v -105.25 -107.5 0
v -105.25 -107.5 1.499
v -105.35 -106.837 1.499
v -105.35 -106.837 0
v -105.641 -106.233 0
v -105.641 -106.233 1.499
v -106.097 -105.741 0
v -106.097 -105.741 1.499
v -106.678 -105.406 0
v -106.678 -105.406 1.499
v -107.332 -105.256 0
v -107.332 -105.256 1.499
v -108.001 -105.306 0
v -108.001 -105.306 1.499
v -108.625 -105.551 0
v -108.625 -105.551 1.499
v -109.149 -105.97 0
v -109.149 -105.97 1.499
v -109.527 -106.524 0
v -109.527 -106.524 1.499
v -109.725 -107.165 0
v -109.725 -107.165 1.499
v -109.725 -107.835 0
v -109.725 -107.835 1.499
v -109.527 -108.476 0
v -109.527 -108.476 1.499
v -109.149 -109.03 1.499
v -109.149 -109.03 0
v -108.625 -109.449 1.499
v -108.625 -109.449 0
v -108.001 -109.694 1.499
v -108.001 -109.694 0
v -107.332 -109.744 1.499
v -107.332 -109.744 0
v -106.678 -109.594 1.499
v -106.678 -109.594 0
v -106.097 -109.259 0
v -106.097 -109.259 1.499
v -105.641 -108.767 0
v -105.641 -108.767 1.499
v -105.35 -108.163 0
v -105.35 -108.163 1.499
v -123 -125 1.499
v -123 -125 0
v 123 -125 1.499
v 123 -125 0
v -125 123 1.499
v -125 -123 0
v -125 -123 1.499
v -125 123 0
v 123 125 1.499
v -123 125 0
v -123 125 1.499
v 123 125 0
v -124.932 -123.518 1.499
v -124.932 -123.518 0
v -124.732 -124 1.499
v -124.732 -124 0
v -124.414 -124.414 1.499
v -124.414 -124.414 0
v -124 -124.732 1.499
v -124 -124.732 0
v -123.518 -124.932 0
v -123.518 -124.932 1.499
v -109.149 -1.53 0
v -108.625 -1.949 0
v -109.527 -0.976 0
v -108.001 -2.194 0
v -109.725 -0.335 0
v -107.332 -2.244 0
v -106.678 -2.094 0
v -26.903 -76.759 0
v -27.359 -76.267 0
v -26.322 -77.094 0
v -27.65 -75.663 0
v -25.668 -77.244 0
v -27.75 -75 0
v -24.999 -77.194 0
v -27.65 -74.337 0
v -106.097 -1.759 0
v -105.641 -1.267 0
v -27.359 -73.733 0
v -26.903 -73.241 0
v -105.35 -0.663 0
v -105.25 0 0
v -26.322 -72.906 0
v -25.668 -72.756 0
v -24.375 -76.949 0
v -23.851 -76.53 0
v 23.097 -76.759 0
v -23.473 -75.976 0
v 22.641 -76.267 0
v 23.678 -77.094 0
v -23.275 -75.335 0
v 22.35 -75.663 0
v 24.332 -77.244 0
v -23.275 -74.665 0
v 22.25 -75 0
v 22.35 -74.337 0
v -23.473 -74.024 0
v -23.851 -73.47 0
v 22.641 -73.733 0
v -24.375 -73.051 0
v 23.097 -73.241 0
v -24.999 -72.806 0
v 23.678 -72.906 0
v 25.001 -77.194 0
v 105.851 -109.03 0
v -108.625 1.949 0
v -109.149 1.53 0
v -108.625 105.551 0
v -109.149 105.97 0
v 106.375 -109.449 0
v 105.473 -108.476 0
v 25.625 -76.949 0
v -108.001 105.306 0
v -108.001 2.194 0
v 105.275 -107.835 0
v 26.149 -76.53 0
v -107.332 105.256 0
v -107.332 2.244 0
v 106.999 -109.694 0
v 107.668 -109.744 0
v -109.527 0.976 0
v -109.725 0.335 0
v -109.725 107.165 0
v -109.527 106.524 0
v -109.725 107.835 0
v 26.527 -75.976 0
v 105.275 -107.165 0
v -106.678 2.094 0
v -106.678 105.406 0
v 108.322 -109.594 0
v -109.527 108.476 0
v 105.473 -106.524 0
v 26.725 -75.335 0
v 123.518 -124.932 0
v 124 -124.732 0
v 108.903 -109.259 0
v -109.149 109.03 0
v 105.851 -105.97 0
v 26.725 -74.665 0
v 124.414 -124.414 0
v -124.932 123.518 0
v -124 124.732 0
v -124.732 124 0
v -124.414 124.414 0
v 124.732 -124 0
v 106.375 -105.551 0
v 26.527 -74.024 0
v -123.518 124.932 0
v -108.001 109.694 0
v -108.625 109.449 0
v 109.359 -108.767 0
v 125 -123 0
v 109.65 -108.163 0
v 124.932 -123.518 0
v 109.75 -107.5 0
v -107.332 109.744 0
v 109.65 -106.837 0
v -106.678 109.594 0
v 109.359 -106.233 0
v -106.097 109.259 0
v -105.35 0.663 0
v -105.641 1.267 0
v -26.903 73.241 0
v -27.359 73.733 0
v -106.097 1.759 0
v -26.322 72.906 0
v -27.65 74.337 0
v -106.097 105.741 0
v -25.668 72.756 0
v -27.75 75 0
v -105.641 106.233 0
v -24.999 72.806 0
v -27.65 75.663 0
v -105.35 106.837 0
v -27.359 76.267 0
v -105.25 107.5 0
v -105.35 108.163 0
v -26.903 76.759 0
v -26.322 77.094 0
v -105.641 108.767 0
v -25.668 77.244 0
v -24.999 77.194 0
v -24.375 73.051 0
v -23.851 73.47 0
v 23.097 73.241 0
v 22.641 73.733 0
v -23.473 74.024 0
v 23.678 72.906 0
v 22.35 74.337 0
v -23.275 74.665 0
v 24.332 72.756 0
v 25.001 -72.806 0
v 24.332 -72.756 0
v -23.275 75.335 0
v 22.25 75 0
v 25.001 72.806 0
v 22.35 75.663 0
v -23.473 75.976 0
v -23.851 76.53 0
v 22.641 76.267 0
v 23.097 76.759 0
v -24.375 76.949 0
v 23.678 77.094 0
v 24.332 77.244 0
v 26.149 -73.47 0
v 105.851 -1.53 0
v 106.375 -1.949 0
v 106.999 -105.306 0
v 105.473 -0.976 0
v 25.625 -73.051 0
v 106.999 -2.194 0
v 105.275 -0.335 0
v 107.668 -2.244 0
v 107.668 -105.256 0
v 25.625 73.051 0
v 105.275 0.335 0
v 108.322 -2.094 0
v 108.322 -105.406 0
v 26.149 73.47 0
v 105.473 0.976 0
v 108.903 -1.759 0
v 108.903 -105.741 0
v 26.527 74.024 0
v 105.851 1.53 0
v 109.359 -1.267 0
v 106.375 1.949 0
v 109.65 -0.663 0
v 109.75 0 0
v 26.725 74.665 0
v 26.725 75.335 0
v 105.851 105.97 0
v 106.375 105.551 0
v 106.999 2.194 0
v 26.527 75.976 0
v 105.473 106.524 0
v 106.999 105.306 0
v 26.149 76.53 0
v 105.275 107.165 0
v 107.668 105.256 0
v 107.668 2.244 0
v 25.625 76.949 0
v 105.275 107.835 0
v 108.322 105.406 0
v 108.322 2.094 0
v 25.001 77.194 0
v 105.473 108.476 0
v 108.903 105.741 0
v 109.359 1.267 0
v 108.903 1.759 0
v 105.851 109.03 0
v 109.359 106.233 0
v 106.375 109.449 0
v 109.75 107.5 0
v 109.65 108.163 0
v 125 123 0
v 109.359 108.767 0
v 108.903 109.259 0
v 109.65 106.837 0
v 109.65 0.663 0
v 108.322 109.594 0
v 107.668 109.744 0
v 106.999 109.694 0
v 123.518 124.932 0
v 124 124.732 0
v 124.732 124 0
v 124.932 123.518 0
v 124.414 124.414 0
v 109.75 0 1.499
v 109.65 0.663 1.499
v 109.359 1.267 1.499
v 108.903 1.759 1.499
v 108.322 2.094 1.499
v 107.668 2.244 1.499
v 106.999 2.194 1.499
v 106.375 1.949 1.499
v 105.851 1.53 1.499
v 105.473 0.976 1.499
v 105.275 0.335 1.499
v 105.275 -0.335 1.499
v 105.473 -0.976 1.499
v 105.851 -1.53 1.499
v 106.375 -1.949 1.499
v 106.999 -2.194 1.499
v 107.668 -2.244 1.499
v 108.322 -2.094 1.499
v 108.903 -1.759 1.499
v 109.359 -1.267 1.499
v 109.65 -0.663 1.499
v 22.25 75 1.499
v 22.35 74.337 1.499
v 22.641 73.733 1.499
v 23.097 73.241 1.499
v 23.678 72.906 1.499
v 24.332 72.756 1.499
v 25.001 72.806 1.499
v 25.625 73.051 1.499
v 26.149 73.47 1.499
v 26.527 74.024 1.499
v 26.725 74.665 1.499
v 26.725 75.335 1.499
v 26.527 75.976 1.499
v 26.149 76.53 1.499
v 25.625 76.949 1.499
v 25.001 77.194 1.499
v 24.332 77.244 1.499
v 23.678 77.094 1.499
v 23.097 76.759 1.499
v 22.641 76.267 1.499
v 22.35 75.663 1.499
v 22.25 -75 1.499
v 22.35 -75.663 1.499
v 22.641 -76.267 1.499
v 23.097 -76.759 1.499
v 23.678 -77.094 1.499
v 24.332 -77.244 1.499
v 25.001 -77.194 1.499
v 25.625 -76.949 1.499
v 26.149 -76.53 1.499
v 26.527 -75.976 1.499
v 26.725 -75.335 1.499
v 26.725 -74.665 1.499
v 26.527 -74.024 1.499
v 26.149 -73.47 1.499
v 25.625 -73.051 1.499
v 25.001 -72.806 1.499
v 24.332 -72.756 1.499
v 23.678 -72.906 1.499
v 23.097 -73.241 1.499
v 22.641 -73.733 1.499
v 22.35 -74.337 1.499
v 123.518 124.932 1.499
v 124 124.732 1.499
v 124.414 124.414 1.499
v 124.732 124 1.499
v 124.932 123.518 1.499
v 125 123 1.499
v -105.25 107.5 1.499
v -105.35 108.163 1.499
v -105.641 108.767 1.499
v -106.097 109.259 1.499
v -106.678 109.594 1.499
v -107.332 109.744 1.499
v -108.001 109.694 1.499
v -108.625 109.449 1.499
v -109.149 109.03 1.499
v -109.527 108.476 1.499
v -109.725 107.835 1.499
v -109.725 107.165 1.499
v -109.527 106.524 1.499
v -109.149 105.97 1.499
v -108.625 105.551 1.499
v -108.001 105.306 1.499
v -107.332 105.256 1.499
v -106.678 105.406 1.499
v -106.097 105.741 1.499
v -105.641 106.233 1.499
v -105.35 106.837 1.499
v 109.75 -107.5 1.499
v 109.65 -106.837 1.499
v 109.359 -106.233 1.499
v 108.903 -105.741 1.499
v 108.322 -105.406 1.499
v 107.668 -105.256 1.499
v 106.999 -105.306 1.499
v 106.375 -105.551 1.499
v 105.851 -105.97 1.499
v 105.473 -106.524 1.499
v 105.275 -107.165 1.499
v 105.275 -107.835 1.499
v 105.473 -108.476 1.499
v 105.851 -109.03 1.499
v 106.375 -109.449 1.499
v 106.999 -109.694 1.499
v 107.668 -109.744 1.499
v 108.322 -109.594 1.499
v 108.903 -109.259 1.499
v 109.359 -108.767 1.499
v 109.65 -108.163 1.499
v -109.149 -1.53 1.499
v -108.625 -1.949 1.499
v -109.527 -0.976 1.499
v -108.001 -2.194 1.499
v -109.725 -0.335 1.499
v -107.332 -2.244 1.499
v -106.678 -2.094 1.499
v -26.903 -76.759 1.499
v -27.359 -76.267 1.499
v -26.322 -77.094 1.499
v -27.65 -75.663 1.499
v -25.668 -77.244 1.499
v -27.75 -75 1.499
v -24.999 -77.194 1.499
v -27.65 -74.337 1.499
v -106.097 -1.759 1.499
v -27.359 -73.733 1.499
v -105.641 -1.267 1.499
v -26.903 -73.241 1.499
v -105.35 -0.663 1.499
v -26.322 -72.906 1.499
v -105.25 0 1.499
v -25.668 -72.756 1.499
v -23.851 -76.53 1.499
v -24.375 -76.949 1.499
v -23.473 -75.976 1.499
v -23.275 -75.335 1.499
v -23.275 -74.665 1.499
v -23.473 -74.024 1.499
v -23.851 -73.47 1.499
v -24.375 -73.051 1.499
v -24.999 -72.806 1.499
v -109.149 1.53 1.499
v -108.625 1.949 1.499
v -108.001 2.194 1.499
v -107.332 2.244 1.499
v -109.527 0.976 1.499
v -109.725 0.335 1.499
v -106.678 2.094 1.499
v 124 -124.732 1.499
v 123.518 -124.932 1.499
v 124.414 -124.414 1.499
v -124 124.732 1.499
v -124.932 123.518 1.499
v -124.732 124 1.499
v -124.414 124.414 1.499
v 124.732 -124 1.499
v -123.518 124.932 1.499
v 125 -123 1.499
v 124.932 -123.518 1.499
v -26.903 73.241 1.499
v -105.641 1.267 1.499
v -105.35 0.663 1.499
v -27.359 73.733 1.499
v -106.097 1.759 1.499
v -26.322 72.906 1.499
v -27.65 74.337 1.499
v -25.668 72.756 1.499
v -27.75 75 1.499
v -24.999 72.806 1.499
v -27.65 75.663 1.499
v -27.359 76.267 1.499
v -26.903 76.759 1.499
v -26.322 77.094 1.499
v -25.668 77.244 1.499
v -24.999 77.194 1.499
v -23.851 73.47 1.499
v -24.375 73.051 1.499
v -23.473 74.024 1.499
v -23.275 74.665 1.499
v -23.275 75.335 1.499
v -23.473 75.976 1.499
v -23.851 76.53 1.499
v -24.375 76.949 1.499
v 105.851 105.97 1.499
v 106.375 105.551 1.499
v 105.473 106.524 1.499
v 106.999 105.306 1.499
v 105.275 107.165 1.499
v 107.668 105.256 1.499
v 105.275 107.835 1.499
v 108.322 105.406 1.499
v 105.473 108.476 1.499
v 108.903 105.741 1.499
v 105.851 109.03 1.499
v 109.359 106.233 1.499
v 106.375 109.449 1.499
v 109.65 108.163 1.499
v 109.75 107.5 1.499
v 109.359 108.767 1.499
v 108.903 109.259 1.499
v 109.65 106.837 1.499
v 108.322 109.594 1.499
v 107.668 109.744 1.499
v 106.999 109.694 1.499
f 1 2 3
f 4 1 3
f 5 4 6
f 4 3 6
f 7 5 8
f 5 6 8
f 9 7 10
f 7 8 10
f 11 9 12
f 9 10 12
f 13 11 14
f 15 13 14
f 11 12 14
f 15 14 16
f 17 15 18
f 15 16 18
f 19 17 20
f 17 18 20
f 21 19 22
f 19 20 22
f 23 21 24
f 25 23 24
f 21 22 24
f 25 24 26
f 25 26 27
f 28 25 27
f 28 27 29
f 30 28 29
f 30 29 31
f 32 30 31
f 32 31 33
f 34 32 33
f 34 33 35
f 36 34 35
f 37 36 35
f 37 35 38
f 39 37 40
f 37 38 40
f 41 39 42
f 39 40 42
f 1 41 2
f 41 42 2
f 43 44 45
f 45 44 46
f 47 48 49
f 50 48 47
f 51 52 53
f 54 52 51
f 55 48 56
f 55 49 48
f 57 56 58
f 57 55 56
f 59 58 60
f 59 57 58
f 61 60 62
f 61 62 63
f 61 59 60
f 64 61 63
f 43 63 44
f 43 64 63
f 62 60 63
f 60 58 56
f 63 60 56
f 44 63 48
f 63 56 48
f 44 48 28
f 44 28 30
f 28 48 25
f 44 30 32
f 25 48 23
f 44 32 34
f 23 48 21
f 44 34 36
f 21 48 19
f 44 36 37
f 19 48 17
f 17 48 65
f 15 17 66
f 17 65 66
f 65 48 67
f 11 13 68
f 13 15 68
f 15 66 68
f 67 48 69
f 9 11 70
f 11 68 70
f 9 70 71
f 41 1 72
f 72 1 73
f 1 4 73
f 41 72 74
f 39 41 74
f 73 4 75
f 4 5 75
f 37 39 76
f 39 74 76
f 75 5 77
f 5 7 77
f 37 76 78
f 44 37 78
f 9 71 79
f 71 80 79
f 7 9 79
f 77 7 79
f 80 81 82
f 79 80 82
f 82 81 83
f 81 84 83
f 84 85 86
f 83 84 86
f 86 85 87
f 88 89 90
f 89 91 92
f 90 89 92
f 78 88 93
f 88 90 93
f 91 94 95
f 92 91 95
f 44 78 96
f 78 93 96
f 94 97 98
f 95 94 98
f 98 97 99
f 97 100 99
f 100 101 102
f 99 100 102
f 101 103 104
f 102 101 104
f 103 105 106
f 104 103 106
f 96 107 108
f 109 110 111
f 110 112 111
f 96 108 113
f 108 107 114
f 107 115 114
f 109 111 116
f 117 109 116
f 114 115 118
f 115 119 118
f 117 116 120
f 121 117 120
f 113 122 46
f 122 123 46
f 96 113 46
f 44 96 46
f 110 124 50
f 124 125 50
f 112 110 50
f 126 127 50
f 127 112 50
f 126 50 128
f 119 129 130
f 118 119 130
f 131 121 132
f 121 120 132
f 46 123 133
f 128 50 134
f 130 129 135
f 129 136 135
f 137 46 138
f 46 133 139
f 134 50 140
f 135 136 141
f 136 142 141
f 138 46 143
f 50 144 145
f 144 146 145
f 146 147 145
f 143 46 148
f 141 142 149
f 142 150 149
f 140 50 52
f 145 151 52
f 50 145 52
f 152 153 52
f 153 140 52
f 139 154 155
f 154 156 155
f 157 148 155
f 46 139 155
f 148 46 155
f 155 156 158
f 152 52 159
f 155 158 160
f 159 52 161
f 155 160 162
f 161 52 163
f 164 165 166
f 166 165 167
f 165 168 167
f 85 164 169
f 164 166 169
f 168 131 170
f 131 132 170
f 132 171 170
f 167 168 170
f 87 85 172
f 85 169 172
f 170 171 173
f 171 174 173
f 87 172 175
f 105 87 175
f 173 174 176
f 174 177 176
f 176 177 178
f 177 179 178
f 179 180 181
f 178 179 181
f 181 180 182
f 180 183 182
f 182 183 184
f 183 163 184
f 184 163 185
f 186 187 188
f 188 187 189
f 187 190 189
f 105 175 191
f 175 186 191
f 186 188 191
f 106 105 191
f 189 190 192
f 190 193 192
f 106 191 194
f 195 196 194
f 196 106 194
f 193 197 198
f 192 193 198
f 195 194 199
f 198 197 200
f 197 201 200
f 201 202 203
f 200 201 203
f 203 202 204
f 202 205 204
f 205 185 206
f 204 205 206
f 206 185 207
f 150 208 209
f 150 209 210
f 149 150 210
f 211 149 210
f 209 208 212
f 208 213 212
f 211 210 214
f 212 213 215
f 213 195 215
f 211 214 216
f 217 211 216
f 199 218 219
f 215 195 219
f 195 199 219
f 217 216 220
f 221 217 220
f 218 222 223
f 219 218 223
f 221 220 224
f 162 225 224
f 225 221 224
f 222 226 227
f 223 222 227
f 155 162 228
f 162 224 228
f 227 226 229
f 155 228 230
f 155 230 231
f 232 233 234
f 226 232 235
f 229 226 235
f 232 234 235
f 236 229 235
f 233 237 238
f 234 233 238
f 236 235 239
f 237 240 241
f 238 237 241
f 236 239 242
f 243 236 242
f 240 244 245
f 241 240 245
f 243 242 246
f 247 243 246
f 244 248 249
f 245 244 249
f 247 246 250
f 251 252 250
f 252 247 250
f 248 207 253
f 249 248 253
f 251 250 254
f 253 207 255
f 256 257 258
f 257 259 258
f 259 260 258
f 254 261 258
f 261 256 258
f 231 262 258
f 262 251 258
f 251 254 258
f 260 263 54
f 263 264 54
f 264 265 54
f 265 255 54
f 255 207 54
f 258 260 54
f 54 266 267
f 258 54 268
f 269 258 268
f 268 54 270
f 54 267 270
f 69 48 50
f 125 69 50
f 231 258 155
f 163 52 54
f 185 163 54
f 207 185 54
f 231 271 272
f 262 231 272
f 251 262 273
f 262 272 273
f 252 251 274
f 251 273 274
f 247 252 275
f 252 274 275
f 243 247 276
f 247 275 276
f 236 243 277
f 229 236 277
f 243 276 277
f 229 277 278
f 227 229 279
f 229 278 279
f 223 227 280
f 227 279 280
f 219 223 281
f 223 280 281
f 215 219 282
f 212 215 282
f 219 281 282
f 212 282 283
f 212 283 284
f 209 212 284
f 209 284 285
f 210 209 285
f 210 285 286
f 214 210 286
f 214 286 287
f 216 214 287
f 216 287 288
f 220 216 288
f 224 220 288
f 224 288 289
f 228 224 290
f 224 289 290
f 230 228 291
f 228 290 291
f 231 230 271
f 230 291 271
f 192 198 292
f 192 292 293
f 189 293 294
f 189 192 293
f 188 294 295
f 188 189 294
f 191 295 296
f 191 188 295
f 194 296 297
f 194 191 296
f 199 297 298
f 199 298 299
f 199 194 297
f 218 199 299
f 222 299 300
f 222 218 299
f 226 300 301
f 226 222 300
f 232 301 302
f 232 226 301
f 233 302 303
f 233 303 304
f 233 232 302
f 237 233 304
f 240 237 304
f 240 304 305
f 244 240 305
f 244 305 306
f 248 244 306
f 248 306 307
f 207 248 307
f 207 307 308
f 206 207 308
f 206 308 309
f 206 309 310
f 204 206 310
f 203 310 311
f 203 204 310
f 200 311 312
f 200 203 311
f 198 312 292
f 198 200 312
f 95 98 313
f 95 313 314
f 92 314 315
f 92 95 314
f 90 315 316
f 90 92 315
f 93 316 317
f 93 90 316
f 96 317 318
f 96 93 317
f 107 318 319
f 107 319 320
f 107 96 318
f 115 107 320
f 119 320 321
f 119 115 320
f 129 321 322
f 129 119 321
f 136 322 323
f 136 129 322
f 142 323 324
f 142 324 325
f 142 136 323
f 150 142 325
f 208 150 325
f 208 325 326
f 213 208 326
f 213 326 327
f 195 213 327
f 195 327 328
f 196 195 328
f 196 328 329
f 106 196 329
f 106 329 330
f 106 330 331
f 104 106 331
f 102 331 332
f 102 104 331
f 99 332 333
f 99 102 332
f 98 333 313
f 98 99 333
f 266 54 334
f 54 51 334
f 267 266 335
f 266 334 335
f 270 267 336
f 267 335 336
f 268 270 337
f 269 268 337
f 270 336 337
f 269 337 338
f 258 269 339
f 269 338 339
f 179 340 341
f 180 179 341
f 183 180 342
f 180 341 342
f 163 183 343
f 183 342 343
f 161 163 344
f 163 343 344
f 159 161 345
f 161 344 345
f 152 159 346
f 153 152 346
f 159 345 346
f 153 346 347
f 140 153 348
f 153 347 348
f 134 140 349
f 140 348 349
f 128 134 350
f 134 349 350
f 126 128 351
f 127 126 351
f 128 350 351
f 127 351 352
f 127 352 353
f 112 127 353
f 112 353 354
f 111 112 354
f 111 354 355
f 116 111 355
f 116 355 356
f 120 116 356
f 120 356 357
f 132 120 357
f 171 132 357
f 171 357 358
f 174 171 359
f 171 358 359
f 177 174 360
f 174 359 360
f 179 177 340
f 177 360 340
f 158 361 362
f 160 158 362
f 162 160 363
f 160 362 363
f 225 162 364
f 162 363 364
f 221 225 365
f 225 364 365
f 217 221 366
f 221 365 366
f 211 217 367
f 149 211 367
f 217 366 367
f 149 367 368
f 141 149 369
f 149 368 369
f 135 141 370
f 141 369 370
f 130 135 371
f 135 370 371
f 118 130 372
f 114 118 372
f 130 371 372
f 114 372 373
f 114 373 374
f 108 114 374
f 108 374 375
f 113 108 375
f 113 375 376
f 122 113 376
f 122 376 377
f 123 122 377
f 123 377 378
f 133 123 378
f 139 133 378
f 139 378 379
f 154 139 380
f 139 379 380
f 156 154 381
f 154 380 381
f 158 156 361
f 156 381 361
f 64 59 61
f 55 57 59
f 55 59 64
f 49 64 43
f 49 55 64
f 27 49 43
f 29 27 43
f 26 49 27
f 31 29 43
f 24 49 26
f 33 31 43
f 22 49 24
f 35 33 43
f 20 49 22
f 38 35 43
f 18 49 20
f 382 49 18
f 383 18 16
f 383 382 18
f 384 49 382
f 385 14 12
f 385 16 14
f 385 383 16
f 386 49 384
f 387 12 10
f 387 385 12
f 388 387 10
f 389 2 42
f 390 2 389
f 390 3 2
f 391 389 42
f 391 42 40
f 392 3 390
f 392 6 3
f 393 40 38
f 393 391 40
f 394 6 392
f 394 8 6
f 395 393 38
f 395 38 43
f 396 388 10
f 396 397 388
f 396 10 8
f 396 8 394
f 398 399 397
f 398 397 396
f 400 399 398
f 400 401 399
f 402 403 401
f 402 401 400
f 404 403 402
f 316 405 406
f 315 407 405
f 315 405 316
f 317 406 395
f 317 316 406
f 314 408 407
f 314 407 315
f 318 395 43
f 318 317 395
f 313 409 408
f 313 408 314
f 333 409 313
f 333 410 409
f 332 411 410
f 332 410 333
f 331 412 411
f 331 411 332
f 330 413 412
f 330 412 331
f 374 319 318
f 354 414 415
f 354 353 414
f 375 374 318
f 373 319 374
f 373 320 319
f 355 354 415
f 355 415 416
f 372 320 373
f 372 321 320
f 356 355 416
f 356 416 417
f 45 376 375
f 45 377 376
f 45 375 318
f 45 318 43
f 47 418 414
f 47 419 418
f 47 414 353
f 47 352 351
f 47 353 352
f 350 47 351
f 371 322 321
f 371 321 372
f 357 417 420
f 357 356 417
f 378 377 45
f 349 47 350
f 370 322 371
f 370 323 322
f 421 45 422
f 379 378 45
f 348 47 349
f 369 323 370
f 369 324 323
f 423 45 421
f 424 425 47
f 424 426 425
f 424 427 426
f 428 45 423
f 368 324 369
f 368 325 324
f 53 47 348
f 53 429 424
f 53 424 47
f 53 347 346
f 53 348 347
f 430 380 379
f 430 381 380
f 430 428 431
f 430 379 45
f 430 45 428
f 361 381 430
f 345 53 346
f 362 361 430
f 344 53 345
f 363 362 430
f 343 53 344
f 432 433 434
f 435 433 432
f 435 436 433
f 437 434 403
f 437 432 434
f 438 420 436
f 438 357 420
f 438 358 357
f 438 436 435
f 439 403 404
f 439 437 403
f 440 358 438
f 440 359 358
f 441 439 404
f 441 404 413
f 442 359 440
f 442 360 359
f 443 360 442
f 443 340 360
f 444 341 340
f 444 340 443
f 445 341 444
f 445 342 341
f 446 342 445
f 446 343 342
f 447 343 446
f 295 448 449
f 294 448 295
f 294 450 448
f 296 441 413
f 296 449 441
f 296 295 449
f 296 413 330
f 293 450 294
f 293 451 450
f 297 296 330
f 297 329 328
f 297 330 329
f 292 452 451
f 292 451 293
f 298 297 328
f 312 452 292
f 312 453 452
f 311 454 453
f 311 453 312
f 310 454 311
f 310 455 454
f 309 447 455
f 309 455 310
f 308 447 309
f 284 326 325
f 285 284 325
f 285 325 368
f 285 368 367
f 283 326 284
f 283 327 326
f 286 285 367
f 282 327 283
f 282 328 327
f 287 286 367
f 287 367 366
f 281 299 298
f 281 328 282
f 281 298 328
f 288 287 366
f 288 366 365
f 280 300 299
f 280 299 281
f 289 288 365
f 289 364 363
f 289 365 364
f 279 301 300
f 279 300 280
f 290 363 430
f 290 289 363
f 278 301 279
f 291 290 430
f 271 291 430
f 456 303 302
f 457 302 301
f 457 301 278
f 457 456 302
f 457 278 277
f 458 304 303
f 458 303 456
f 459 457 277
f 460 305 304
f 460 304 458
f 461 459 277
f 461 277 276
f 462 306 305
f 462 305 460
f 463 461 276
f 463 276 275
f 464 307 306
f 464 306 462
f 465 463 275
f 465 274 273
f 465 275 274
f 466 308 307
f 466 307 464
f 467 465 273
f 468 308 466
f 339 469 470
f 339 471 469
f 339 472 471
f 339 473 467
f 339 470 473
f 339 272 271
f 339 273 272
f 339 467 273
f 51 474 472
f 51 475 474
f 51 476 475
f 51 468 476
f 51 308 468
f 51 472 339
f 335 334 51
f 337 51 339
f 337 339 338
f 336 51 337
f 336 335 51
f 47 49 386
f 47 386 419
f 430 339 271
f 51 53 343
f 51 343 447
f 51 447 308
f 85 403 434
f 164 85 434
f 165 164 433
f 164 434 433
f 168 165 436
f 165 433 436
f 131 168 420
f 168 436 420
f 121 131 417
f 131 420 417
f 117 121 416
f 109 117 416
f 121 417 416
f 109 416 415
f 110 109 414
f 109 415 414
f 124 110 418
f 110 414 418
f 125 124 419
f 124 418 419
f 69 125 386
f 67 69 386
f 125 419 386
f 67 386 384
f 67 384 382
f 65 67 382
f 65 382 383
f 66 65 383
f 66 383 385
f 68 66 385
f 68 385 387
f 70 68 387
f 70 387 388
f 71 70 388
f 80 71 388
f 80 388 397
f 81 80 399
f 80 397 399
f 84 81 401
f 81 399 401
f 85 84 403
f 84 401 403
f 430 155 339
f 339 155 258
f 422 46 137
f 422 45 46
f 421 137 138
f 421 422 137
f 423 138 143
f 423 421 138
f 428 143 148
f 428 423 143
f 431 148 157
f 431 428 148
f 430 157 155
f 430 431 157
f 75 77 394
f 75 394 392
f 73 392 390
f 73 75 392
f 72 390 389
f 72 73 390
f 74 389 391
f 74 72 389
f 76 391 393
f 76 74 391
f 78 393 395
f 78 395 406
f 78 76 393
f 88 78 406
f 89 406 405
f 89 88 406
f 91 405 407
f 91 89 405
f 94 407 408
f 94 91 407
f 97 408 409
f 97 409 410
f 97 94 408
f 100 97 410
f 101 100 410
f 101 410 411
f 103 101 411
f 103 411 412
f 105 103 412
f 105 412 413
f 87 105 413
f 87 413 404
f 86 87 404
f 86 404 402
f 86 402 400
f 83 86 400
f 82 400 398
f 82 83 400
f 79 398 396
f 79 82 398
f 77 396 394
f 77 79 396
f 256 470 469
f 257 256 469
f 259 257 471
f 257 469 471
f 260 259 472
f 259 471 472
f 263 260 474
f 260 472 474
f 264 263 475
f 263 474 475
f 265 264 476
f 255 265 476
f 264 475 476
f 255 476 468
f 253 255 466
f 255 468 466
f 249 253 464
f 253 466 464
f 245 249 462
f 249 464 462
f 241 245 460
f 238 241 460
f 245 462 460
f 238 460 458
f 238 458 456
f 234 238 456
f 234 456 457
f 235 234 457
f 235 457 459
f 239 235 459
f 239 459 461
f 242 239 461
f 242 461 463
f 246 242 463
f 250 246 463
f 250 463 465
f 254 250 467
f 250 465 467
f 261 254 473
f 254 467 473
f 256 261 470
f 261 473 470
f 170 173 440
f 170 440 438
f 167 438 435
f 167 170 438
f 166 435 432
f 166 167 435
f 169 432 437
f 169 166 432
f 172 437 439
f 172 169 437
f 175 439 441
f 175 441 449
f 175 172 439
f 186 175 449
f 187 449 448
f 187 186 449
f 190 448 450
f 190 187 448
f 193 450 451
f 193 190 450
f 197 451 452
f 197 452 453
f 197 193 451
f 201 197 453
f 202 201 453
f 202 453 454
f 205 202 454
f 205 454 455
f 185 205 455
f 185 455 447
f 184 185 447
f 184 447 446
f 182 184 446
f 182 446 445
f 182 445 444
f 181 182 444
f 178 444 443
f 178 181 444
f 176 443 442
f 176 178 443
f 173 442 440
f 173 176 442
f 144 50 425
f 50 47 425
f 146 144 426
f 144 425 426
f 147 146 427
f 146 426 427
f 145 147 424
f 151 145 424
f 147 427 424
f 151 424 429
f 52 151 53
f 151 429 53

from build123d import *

# Parameters (mm, degrees)
SKETCH1_W           = 250
SKETCH1_H           = 250
SKETCH1_R           = 2.25
BOSS_EXTRUDE1_DEPTH = 1.4986
FILLET1_R           = 2
SKETCH2_R           = 2.25
CUT_EXTRUDE1_DEPTH  = 1.4986


with BuildPart() as part:
    # Sketch1 → Boss-Extrude1 (new body)
    with BuildSketch(Plane.XY):
        Rectangle(SKETCH1_W, SKETCH1_H)
        with Locations(Location((-25.5, 75, 0), (0, 0, 180))):
            Circle(SKETCH1_R, mode=Mode.SUBTRACT)
        with Locations(Location((24.5, 75, 0), (0, 0, 180))):
            Circle(SKETCH1_R, mode=Mode.SUBTRACT)
        with Locations(Location((24.5, -75, 0), (0, 0, 180))):
            Circle(SKETCH1_R, mode=Mode.SUBTRACT)
        with Locations(Location((-25.5, -75, 0), (0, 0, 180))):
            Circle(SKETCH1_R, mode=Mode.SUBTRACT)
    extrude(amount=BOSS_EXTRUDE1_DEPTH)

    # Fillet1
    fillet1_edges = [part.edges().sort_by_distance(p)[0] for p in [
        (125, -125, 0.7493),
        (-125, -125, 0.7493),
        (-125, 125, 0.7493),
        (125, 125, 0.7493),
    ]]
    fillet(fillet1_edges, radius=FILLET1_R)

    # Sketch2 → Cut-Extrude1 (cut)
    with BuildSketch(Plane.XY.offset(1.4986)):
        with Locations((-107.5, 107.5)):
            Circle(SKETCH2_R)
        with Locations((107.5, 107.5)):
            Circle(SKETCH2_R)
        with Locations((107.5, -107.5)):
            Circle(SKETCH2_R)
        with Locations((-107.5, -107.5)):
            Circle(SKETCH2_R)
        with Locations((-107.5, 0)):
            Circle(SKETCH2_R)
        with Locations((107.5, 0)):
            Circle(SKETCH2_R)
    extrude(amount=-CUT_EXTRUDE1_DEPTH, mode=Mode.SUBTRACT)


solid = part.part
